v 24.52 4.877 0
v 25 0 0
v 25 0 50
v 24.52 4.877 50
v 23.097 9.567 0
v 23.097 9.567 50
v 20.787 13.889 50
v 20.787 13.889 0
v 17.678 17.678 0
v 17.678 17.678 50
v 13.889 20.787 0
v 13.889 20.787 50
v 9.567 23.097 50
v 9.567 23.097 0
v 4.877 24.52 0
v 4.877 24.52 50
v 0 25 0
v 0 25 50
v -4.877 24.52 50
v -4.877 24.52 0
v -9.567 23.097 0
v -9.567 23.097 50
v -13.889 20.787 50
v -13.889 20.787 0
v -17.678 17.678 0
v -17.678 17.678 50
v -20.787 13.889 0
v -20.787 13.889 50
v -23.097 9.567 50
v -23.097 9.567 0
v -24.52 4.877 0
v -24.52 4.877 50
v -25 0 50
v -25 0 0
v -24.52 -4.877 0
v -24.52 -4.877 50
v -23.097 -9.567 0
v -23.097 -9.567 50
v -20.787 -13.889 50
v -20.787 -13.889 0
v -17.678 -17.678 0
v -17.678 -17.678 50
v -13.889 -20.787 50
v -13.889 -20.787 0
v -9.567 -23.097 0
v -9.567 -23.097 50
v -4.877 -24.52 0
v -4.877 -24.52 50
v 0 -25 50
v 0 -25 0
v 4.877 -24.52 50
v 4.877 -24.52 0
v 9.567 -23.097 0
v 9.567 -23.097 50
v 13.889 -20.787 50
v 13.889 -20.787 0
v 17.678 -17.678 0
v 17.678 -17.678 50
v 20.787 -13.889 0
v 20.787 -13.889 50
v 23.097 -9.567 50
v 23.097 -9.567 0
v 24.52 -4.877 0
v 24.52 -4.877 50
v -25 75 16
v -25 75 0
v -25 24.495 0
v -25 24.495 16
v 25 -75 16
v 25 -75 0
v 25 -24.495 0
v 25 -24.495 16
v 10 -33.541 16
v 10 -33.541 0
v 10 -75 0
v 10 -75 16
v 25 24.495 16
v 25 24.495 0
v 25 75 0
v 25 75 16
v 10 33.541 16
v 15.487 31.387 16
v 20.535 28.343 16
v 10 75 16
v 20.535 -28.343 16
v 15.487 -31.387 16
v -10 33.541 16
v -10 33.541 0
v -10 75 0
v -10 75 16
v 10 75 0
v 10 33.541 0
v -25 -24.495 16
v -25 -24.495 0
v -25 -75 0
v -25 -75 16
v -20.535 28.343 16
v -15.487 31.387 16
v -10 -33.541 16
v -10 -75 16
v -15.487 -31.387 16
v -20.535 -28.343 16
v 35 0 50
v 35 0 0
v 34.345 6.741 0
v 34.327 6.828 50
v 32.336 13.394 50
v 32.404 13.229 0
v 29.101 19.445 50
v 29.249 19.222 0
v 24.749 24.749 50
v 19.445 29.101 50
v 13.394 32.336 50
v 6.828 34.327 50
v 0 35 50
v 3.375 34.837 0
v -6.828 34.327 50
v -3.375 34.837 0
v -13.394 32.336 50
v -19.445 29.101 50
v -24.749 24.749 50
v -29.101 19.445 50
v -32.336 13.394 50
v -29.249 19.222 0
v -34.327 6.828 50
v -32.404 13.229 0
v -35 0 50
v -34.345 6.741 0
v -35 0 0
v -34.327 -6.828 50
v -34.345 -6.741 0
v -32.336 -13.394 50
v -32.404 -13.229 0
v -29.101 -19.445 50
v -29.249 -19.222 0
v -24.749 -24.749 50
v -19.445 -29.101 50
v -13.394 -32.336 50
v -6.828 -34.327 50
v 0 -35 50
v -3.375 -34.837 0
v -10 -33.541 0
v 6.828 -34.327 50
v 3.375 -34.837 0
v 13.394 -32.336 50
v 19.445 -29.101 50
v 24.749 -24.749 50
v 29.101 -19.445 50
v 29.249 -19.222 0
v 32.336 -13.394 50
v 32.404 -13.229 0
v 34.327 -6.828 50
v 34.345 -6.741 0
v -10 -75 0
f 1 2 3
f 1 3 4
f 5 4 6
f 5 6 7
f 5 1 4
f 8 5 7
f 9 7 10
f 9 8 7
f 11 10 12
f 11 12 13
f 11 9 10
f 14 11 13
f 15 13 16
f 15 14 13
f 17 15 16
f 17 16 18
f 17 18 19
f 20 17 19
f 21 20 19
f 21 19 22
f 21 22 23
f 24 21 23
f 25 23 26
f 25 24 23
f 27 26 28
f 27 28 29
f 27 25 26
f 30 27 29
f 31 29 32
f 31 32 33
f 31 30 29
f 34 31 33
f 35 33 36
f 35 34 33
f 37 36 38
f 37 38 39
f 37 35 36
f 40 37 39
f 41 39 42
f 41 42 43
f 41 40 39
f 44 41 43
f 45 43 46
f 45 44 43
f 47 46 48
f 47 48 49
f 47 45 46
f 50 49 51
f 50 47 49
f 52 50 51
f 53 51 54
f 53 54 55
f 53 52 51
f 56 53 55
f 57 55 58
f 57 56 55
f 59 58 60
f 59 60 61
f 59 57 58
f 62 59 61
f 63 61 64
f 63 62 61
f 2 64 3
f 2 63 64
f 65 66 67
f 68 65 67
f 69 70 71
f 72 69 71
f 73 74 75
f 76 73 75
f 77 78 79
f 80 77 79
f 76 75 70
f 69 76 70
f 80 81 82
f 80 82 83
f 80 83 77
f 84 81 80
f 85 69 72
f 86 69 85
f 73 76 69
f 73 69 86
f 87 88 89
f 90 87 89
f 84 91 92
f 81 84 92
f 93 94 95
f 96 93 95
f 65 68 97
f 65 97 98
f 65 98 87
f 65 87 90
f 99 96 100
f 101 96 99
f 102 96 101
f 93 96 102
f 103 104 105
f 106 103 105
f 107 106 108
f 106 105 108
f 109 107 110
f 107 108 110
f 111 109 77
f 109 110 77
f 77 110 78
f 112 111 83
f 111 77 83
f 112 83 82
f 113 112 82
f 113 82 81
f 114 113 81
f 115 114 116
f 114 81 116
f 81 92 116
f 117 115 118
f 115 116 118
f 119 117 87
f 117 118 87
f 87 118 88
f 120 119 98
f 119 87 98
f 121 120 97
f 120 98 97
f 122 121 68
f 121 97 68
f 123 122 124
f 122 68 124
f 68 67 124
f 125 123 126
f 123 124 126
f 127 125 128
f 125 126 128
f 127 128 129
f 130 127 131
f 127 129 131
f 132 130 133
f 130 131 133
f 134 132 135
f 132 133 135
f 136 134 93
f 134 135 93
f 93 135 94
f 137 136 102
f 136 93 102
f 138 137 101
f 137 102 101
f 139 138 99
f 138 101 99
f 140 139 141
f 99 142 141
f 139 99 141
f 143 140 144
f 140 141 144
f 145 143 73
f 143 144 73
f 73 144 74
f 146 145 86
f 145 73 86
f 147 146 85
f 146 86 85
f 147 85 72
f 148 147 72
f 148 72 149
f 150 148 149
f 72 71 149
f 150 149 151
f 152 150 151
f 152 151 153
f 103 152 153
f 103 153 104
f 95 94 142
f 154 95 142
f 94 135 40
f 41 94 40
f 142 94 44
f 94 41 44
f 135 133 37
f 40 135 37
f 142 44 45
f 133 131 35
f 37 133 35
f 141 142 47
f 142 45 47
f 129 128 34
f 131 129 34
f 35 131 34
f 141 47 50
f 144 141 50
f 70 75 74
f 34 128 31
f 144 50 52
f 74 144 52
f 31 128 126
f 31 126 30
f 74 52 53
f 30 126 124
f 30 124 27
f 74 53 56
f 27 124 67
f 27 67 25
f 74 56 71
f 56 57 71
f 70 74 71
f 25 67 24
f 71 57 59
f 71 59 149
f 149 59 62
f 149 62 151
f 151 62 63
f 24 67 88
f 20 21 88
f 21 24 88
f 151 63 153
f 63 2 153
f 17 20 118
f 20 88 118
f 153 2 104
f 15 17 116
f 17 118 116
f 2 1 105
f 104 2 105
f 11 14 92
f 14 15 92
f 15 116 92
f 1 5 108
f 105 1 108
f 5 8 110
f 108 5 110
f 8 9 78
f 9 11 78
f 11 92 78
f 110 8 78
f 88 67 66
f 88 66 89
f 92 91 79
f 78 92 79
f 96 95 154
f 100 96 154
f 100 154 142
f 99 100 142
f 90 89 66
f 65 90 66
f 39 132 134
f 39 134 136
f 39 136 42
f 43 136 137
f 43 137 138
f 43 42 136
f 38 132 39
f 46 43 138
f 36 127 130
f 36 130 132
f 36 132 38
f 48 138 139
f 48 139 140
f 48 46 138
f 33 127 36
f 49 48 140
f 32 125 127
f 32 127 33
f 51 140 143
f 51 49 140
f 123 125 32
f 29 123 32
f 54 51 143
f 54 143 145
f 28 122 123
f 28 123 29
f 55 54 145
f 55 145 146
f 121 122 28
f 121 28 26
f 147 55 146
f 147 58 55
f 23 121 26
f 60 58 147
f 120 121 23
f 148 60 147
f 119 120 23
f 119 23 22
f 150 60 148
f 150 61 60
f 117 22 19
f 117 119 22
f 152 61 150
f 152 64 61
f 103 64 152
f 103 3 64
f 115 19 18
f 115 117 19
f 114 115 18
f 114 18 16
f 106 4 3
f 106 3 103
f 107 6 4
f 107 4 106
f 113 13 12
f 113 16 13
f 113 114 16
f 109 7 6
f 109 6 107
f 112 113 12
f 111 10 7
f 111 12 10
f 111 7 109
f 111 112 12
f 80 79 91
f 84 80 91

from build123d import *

# Parameters (mm, degrees)
SKETCH1_R           = 25
BOSS_EXTRUDE1_DEPTH = 50
BOSS_EXTRUDE2_DEPTH = 16


with BuildPart() as part:
    # Sketch1 → Boss-Extrude1 (new body)
    with BuildSketch(Plane(origin=(0, 0, 0), x_dir=(0, 1, 0), z_dir=(0, 0, 1))):
        with BuildLine():
            ThreePointArc((-33.541019662, 10), (-35, 0), (-33.541019662, -10))
            ThreePointArc((-33.541019662, -10), (-29.971518449, -18.075067963), (-24.494897428, -25))
            ThreePointArc((-24.494897428, -25), (0, -35), (24.494897428, -25))
            ThreePointArc((24.494897428, -25), (29.971518449, -18.075067963), (33.541019662, -10))
            ThreePointArc((33.541019662, -10), (34.633334291, -5.052935375), (35, 0))
            ThreePointArc((35, 0), (34.633334291, 5.052935375), (33.541019662, 10))
            ThreePointArc((33.541019662, 10), (29.971518449, 18.075067963), (24.494897428, 25))
            ThreePointArc((24.494897428, 25), (0, 35), (-24.494897428, 25))
            ThreePointArc((-24.494897428, 25), (-29.971518449, 18.075067963), (-33.541019662, 10))
        make_face()
        Circle(SKETCH1_R, mode=Mode.SUBTRACT)
    extrude(amount=BOSS_EXTRUDE1_DEPTH)

    # Sketch1<3> → Boss-Extrude2 (add)
    with BuildSketch(Plane(origin=(0, 0, 0), x_dir=(0, 1, 0), z_dir=(0, 0, 1))):
        with BuildLine():
            Line((-33.541019662, -10), (-75, -10))
            Line((-75, -10), (-75, -25))
            Line((-75, -25), (-24.494897428, -25))
            ThreePointArc((-24.494897428, -25), (-29.971518449, -18.075067963), (-33.541019662, -10))
        make_face()
        with BuildLine():
            Line((-75, 10), (-33.541019662, 10))
            ThreePointArc((-33.541019662, 10), (-29.971518449, 18.075067963), (-24.494897428, 25))
            Line((-24.494897428, 25), (-75, 25))
            Line((-75, 25), (-75, 10))
        make_face()
        with BuildLine():
            ThreePointArc((33.541019662, -10), (29.971518449, -18.075067963), (24.494897428, -25))
            Line((24.494897428, -25), (75, -25))
            Line((75, -25), (75, -10))
            Line((75, -10), (33.541019662, -10))
        make_face()
        with BuildLine():
            Line((75, 25), (24.494897428, 25))
            ThreePointArc((24.494897428, 25), (29.971518449, 18.075067963), (33.541019662, 10))
            Line((33.541019662, 10), (75, 10))
            Line((75, 10), (75, 25))
        make_face()
    extrude(amount=BOSS_EXTRUDE2_DEPTH)


solid = part.part
